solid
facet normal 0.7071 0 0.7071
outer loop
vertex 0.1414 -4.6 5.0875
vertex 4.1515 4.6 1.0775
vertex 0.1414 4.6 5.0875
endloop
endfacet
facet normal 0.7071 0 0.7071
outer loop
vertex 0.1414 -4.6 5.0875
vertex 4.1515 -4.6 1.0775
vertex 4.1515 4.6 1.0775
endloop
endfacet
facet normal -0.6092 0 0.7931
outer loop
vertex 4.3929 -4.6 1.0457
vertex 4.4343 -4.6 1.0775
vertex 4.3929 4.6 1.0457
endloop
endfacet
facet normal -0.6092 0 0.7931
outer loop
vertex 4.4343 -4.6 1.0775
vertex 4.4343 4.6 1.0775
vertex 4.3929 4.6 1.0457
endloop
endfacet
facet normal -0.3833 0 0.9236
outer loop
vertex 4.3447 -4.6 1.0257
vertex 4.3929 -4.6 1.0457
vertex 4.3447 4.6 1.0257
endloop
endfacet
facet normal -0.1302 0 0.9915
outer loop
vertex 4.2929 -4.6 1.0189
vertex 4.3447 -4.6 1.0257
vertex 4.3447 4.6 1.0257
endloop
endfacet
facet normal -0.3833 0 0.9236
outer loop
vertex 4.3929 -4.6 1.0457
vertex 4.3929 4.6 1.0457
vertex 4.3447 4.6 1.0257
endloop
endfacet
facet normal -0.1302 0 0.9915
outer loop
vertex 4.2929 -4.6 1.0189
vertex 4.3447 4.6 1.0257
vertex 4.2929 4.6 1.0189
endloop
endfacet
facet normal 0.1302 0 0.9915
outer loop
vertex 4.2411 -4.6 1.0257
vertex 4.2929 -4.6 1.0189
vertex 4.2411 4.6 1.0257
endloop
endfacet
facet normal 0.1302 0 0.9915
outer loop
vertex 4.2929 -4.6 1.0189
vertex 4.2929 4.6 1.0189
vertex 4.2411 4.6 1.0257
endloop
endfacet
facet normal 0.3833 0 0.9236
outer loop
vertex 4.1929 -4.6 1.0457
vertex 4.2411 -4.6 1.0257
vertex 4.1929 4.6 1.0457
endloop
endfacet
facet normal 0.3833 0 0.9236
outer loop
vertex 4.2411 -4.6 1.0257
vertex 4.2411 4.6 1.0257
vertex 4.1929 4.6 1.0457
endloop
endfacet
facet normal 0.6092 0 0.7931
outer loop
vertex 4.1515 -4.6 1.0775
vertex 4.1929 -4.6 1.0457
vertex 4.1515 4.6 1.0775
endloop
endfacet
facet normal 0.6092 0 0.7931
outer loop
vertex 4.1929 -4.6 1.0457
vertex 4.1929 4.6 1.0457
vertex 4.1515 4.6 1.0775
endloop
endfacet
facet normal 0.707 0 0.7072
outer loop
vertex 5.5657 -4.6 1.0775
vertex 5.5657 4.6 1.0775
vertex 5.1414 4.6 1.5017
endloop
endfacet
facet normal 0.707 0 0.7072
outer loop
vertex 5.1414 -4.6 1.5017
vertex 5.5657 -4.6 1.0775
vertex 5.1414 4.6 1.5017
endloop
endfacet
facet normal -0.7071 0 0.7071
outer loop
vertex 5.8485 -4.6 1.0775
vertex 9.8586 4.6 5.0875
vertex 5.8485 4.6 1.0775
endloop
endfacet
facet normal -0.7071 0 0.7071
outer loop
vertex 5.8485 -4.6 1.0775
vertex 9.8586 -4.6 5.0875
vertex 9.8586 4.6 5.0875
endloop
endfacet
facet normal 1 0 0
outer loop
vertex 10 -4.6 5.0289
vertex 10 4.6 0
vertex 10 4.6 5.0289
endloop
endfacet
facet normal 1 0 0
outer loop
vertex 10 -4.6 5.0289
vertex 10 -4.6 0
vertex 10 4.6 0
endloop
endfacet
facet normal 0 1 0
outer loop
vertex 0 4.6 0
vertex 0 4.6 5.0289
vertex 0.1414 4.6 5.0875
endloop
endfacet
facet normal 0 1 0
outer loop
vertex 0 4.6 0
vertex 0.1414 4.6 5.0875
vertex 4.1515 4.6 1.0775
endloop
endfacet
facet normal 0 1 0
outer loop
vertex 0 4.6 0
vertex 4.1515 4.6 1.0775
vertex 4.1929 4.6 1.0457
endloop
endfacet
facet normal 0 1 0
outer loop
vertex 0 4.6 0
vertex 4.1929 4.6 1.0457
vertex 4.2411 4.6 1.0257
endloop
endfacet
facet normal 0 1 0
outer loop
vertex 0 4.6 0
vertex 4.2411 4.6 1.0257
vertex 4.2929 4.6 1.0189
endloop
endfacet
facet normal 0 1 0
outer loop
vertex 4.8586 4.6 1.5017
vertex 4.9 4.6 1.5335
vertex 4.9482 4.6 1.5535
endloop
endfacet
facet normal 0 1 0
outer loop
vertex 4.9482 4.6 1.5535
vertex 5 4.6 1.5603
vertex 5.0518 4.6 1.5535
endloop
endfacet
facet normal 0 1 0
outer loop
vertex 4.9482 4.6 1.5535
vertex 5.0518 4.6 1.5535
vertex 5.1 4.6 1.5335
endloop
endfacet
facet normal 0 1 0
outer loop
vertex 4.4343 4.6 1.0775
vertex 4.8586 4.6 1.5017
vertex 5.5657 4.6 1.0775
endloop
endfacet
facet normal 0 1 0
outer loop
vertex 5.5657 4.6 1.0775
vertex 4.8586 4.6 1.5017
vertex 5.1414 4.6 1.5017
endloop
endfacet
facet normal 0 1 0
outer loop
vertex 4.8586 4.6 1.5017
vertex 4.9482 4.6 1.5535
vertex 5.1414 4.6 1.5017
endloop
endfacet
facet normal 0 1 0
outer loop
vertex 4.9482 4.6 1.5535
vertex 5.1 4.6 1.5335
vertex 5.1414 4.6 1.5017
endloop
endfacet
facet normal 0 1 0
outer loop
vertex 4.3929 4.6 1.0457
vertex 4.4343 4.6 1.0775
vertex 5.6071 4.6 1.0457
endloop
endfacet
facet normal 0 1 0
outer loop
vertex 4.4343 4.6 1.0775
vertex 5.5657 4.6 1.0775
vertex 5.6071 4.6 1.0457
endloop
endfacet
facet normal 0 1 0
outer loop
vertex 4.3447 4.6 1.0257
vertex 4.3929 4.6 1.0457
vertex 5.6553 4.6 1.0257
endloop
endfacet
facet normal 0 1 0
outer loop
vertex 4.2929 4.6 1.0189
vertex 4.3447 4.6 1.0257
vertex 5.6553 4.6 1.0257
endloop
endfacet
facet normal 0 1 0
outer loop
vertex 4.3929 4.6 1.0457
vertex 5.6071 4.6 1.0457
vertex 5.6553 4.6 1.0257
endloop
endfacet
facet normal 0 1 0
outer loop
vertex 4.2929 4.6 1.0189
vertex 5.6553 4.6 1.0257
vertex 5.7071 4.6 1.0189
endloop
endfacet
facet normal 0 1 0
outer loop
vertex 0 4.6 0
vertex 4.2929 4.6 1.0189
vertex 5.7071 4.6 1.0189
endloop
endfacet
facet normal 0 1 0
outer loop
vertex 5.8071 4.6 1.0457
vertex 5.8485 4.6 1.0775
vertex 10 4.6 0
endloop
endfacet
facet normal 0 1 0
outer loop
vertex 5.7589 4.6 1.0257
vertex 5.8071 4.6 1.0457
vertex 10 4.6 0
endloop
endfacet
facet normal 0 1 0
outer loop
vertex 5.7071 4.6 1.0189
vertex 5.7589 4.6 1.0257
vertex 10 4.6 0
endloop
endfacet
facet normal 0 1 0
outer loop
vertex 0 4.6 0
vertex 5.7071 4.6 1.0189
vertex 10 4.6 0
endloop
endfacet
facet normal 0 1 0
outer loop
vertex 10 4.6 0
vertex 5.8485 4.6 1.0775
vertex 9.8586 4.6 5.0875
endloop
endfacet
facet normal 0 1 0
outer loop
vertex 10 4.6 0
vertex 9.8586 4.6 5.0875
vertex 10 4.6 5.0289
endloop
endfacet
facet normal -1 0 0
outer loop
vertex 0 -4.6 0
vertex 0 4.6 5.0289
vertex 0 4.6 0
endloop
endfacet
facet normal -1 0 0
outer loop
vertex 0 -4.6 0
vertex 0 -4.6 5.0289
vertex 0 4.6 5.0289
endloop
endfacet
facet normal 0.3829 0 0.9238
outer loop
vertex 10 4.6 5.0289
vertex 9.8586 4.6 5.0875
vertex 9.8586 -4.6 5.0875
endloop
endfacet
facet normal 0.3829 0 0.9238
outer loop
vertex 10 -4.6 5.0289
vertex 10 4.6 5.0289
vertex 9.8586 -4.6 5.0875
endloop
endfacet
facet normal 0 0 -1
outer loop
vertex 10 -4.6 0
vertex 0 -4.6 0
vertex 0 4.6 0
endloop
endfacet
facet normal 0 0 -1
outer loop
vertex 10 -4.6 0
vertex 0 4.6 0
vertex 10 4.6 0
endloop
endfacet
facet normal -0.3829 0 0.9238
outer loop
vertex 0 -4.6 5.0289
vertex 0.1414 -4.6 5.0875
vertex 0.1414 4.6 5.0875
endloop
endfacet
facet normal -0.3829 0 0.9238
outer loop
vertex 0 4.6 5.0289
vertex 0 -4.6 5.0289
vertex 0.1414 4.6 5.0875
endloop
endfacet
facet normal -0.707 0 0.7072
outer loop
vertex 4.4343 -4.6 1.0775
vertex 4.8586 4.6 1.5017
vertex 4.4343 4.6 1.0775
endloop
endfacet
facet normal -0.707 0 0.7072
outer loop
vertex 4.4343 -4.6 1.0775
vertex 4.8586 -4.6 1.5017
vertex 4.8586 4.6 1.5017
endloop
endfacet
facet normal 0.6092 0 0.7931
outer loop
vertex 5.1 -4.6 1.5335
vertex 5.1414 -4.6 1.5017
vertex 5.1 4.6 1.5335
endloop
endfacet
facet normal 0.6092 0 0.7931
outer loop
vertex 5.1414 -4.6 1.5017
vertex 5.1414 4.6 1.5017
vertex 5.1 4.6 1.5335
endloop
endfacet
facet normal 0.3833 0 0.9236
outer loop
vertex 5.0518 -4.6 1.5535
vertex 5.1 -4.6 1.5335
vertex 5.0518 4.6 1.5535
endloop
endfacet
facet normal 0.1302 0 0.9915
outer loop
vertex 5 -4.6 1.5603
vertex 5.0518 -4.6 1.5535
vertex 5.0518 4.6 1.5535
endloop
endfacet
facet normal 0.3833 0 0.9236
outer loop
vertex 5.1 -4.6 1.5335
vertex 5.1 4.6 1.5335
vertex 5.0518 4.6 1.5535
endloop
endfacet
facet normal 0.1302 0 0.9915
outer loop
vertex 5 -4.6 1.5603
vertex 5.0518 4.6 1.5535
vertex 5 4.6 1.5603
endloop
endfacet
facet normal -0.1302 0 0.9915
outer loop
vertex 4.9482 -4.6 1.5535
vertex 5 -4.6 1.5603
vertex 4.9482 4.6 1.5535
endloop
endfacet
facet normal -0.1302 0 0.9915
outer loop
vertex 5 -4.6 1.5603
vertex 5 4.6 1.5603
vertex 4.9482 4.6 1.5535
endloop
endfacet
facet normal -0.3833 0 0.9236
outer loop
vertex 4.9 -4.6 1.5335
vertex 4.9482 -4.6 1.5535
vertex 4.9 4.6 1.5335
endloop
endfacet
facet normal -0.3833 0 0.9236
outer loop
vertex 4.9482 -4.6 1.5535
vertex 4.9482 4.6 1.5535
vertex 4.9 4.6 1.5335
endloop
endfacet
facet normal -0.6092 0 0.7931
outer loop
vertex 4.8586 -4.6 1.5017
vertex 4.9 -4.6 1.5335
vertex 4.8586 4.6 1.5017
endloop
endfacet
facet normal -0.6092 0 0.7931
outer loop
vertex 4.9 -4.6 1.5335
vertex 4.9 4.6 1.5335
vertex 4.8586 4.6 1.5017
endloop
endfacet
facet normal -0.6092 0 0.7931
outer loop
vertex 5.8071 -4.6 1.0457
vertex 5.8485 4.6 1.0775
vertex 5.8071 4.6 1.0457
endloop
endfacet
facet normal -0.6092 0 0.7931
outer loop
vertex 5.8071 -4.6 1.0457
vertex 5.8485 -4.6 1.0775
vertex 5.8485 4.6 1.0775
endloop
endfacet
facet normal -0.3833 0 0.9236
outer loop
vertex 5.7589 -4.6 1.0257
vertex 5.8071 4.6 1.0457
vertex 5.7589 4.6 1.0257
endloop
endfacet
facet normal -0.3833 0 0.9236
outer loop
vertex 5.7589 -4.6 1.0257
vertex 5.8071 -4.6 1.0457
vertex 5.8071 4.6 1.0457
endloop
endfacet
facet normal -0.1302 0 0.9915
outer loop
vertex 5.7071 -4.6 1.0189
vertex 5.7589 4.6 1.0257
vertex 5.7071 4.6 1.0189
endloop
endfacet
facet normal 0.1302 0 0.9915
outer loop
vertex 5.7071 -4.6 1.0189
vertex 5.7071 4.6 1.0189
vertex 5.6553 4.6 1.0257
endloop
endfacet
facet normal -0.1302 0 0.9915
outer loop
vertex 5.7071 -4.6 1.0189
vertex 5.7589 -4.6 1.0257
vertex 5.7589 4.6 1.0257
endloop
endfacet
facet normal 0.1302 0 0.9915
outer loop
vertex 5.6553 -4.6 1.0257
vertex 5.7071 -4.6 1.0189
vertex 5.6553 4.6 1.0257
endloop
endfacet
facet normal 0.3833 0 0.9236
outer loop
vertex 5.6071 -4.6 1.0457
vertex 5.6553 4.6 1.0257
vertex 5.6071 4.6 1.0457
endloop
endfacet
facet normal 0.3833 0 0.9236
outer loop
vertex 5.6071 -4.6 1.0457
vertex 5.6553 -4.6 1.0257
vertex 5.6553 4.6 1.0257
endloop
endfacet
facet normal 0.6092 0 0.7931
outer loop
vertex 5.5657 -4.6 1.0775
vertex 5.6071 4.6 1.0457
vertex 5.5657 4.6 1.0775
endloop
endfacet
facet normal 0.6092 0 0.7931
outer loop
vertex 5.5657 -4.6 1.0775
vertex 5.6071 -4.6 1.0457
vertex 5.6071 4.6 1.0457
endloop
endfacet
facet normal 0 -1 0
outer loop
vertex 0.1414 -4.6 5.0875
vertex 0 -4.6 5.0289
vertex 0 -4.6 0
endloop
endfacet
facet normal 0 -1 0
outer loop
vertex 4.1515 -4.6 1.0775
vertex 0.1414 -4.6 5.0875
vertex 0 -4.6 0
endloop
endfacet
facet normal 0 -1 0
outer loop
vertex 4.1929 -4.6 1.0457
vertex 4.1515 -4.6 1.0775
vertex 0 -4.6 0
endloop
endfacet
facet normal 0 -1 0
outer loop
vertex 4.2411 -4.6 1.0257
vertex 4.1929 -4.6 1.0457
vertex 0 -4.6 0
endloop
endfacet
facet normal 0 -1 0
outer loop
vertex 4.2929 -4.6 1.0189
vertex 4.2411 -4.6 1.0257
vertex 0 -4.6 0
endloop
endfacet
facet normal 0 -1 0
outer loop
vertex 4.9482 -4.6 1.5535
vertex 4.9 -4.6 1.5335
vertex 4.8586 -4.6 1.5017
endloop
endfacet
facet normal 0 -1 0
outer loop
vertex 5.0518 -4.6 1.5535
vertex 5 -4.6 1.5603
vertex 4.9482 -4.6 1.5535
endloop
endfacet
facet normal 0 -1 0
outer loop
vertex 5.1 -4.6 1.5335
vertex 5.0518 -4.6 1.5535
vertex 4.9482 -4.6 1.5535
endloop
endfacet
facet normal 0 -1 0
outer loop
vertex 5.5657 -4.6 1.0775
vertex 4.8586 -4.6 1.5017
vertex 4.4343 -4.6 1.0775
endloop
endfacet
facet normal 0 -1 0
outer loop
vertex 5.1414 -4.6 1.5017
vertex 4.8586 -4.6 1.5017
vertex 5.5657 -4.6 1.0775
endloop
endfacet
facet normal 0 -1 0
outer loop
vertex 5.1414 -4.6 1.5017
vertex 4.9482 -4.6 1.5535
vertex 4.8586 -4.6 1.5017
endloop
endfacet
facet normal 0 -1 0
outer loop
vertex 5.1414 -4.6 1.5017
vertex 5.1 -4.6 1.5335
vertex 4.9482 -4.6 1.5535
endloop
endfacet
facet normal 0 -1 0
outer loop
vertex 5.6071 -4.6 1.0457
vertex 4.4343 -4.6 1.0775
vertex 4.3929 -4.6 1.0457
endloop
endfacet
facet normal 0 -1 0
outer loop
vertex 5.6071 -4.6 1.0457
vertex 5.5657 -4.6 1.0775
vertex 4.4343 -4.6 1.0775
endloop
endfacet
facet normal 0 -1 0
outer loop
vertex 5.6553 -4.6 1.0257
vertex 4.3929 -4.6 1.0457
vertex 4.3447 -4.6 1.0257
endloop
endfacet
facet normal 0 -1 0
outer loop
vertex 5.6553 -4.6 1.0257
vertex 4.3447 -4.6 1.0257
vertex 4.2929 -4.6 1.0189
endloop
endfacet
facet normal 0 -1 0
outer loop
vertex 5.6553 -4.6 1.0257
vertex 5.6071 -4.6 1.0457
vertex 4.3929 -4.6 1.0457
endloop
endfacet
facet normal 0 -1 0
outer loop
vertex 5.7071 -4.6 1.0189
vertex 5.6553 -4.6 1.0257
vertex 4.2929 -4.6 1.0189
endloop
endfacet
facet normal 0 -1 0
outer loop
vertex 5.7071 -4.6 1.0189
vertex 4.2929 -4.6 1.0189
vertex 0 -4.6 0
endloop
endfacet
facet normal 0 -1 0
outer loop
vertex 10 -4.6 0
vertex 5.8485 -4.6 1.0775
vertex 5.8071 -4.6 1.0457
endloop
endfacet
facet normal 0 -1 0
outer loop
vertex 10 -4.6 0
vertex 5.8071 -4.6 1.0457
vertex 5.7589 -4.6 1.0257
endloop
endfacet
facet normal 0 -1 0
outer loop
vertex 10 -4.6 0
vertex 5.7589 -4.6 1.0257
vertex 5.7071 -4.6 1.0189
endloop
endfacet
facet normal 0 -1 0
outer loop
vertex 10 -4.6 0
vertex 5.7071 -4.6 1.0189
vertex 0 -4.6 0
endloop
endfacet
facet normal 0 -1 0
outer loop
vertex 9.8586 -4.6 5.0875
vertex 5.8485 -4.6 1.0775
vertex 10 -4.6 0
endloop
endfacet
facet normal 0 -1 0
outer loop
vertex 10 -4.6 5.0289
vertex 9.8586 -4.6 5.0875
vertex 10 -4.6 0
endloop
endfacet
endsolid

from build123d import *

# Parameters (mm, degrees)
F1_DEPTH = 4.6
F2_SIZE  = 0.2
F3_SIZE  = 0.2
F4_R     = 0.2


with BuildPart() as f1:
    # F0 (on Front) → F1 (new body, symmetric)
    with BuildSketch(Plane.XZ):
        Polygon((0, 5.228932), (0, 0), (10, 0), (10, 5.228932), (9.313961, 4.542893), (5.707107, 0.936039), (5, 1.643146), (4.292893, 0.936039), (0.686039, 4.542893), align=None)
    extrude(amount=F1_DEPTH, both=True)

    # F2
    f2_edges = [f1.edges().sort_by_distance(p)[0] for p in [
        (0, 0, 5.228932),
    ]]
    chamfer(f2_edges, length=F2_SIZE)

    # F3
    f3_edges = [f1.edges().sort_by_distance(p)[0] for p in [
        (10, 0, 5.228932),
    ]]
    chamfer(f3_edges, length=F3_SIZE)

    # F4
    f4_edges = [f1.edges().sort_by_distance(p)[0] for p in [
        (4.292893, 0, 0.936039),
        (5, 0, 1.643146),
        (5.707107, 0, 0.936039),
    ]]
    fillet(f4_edges, radius=F4_R)


solid = f1.part
